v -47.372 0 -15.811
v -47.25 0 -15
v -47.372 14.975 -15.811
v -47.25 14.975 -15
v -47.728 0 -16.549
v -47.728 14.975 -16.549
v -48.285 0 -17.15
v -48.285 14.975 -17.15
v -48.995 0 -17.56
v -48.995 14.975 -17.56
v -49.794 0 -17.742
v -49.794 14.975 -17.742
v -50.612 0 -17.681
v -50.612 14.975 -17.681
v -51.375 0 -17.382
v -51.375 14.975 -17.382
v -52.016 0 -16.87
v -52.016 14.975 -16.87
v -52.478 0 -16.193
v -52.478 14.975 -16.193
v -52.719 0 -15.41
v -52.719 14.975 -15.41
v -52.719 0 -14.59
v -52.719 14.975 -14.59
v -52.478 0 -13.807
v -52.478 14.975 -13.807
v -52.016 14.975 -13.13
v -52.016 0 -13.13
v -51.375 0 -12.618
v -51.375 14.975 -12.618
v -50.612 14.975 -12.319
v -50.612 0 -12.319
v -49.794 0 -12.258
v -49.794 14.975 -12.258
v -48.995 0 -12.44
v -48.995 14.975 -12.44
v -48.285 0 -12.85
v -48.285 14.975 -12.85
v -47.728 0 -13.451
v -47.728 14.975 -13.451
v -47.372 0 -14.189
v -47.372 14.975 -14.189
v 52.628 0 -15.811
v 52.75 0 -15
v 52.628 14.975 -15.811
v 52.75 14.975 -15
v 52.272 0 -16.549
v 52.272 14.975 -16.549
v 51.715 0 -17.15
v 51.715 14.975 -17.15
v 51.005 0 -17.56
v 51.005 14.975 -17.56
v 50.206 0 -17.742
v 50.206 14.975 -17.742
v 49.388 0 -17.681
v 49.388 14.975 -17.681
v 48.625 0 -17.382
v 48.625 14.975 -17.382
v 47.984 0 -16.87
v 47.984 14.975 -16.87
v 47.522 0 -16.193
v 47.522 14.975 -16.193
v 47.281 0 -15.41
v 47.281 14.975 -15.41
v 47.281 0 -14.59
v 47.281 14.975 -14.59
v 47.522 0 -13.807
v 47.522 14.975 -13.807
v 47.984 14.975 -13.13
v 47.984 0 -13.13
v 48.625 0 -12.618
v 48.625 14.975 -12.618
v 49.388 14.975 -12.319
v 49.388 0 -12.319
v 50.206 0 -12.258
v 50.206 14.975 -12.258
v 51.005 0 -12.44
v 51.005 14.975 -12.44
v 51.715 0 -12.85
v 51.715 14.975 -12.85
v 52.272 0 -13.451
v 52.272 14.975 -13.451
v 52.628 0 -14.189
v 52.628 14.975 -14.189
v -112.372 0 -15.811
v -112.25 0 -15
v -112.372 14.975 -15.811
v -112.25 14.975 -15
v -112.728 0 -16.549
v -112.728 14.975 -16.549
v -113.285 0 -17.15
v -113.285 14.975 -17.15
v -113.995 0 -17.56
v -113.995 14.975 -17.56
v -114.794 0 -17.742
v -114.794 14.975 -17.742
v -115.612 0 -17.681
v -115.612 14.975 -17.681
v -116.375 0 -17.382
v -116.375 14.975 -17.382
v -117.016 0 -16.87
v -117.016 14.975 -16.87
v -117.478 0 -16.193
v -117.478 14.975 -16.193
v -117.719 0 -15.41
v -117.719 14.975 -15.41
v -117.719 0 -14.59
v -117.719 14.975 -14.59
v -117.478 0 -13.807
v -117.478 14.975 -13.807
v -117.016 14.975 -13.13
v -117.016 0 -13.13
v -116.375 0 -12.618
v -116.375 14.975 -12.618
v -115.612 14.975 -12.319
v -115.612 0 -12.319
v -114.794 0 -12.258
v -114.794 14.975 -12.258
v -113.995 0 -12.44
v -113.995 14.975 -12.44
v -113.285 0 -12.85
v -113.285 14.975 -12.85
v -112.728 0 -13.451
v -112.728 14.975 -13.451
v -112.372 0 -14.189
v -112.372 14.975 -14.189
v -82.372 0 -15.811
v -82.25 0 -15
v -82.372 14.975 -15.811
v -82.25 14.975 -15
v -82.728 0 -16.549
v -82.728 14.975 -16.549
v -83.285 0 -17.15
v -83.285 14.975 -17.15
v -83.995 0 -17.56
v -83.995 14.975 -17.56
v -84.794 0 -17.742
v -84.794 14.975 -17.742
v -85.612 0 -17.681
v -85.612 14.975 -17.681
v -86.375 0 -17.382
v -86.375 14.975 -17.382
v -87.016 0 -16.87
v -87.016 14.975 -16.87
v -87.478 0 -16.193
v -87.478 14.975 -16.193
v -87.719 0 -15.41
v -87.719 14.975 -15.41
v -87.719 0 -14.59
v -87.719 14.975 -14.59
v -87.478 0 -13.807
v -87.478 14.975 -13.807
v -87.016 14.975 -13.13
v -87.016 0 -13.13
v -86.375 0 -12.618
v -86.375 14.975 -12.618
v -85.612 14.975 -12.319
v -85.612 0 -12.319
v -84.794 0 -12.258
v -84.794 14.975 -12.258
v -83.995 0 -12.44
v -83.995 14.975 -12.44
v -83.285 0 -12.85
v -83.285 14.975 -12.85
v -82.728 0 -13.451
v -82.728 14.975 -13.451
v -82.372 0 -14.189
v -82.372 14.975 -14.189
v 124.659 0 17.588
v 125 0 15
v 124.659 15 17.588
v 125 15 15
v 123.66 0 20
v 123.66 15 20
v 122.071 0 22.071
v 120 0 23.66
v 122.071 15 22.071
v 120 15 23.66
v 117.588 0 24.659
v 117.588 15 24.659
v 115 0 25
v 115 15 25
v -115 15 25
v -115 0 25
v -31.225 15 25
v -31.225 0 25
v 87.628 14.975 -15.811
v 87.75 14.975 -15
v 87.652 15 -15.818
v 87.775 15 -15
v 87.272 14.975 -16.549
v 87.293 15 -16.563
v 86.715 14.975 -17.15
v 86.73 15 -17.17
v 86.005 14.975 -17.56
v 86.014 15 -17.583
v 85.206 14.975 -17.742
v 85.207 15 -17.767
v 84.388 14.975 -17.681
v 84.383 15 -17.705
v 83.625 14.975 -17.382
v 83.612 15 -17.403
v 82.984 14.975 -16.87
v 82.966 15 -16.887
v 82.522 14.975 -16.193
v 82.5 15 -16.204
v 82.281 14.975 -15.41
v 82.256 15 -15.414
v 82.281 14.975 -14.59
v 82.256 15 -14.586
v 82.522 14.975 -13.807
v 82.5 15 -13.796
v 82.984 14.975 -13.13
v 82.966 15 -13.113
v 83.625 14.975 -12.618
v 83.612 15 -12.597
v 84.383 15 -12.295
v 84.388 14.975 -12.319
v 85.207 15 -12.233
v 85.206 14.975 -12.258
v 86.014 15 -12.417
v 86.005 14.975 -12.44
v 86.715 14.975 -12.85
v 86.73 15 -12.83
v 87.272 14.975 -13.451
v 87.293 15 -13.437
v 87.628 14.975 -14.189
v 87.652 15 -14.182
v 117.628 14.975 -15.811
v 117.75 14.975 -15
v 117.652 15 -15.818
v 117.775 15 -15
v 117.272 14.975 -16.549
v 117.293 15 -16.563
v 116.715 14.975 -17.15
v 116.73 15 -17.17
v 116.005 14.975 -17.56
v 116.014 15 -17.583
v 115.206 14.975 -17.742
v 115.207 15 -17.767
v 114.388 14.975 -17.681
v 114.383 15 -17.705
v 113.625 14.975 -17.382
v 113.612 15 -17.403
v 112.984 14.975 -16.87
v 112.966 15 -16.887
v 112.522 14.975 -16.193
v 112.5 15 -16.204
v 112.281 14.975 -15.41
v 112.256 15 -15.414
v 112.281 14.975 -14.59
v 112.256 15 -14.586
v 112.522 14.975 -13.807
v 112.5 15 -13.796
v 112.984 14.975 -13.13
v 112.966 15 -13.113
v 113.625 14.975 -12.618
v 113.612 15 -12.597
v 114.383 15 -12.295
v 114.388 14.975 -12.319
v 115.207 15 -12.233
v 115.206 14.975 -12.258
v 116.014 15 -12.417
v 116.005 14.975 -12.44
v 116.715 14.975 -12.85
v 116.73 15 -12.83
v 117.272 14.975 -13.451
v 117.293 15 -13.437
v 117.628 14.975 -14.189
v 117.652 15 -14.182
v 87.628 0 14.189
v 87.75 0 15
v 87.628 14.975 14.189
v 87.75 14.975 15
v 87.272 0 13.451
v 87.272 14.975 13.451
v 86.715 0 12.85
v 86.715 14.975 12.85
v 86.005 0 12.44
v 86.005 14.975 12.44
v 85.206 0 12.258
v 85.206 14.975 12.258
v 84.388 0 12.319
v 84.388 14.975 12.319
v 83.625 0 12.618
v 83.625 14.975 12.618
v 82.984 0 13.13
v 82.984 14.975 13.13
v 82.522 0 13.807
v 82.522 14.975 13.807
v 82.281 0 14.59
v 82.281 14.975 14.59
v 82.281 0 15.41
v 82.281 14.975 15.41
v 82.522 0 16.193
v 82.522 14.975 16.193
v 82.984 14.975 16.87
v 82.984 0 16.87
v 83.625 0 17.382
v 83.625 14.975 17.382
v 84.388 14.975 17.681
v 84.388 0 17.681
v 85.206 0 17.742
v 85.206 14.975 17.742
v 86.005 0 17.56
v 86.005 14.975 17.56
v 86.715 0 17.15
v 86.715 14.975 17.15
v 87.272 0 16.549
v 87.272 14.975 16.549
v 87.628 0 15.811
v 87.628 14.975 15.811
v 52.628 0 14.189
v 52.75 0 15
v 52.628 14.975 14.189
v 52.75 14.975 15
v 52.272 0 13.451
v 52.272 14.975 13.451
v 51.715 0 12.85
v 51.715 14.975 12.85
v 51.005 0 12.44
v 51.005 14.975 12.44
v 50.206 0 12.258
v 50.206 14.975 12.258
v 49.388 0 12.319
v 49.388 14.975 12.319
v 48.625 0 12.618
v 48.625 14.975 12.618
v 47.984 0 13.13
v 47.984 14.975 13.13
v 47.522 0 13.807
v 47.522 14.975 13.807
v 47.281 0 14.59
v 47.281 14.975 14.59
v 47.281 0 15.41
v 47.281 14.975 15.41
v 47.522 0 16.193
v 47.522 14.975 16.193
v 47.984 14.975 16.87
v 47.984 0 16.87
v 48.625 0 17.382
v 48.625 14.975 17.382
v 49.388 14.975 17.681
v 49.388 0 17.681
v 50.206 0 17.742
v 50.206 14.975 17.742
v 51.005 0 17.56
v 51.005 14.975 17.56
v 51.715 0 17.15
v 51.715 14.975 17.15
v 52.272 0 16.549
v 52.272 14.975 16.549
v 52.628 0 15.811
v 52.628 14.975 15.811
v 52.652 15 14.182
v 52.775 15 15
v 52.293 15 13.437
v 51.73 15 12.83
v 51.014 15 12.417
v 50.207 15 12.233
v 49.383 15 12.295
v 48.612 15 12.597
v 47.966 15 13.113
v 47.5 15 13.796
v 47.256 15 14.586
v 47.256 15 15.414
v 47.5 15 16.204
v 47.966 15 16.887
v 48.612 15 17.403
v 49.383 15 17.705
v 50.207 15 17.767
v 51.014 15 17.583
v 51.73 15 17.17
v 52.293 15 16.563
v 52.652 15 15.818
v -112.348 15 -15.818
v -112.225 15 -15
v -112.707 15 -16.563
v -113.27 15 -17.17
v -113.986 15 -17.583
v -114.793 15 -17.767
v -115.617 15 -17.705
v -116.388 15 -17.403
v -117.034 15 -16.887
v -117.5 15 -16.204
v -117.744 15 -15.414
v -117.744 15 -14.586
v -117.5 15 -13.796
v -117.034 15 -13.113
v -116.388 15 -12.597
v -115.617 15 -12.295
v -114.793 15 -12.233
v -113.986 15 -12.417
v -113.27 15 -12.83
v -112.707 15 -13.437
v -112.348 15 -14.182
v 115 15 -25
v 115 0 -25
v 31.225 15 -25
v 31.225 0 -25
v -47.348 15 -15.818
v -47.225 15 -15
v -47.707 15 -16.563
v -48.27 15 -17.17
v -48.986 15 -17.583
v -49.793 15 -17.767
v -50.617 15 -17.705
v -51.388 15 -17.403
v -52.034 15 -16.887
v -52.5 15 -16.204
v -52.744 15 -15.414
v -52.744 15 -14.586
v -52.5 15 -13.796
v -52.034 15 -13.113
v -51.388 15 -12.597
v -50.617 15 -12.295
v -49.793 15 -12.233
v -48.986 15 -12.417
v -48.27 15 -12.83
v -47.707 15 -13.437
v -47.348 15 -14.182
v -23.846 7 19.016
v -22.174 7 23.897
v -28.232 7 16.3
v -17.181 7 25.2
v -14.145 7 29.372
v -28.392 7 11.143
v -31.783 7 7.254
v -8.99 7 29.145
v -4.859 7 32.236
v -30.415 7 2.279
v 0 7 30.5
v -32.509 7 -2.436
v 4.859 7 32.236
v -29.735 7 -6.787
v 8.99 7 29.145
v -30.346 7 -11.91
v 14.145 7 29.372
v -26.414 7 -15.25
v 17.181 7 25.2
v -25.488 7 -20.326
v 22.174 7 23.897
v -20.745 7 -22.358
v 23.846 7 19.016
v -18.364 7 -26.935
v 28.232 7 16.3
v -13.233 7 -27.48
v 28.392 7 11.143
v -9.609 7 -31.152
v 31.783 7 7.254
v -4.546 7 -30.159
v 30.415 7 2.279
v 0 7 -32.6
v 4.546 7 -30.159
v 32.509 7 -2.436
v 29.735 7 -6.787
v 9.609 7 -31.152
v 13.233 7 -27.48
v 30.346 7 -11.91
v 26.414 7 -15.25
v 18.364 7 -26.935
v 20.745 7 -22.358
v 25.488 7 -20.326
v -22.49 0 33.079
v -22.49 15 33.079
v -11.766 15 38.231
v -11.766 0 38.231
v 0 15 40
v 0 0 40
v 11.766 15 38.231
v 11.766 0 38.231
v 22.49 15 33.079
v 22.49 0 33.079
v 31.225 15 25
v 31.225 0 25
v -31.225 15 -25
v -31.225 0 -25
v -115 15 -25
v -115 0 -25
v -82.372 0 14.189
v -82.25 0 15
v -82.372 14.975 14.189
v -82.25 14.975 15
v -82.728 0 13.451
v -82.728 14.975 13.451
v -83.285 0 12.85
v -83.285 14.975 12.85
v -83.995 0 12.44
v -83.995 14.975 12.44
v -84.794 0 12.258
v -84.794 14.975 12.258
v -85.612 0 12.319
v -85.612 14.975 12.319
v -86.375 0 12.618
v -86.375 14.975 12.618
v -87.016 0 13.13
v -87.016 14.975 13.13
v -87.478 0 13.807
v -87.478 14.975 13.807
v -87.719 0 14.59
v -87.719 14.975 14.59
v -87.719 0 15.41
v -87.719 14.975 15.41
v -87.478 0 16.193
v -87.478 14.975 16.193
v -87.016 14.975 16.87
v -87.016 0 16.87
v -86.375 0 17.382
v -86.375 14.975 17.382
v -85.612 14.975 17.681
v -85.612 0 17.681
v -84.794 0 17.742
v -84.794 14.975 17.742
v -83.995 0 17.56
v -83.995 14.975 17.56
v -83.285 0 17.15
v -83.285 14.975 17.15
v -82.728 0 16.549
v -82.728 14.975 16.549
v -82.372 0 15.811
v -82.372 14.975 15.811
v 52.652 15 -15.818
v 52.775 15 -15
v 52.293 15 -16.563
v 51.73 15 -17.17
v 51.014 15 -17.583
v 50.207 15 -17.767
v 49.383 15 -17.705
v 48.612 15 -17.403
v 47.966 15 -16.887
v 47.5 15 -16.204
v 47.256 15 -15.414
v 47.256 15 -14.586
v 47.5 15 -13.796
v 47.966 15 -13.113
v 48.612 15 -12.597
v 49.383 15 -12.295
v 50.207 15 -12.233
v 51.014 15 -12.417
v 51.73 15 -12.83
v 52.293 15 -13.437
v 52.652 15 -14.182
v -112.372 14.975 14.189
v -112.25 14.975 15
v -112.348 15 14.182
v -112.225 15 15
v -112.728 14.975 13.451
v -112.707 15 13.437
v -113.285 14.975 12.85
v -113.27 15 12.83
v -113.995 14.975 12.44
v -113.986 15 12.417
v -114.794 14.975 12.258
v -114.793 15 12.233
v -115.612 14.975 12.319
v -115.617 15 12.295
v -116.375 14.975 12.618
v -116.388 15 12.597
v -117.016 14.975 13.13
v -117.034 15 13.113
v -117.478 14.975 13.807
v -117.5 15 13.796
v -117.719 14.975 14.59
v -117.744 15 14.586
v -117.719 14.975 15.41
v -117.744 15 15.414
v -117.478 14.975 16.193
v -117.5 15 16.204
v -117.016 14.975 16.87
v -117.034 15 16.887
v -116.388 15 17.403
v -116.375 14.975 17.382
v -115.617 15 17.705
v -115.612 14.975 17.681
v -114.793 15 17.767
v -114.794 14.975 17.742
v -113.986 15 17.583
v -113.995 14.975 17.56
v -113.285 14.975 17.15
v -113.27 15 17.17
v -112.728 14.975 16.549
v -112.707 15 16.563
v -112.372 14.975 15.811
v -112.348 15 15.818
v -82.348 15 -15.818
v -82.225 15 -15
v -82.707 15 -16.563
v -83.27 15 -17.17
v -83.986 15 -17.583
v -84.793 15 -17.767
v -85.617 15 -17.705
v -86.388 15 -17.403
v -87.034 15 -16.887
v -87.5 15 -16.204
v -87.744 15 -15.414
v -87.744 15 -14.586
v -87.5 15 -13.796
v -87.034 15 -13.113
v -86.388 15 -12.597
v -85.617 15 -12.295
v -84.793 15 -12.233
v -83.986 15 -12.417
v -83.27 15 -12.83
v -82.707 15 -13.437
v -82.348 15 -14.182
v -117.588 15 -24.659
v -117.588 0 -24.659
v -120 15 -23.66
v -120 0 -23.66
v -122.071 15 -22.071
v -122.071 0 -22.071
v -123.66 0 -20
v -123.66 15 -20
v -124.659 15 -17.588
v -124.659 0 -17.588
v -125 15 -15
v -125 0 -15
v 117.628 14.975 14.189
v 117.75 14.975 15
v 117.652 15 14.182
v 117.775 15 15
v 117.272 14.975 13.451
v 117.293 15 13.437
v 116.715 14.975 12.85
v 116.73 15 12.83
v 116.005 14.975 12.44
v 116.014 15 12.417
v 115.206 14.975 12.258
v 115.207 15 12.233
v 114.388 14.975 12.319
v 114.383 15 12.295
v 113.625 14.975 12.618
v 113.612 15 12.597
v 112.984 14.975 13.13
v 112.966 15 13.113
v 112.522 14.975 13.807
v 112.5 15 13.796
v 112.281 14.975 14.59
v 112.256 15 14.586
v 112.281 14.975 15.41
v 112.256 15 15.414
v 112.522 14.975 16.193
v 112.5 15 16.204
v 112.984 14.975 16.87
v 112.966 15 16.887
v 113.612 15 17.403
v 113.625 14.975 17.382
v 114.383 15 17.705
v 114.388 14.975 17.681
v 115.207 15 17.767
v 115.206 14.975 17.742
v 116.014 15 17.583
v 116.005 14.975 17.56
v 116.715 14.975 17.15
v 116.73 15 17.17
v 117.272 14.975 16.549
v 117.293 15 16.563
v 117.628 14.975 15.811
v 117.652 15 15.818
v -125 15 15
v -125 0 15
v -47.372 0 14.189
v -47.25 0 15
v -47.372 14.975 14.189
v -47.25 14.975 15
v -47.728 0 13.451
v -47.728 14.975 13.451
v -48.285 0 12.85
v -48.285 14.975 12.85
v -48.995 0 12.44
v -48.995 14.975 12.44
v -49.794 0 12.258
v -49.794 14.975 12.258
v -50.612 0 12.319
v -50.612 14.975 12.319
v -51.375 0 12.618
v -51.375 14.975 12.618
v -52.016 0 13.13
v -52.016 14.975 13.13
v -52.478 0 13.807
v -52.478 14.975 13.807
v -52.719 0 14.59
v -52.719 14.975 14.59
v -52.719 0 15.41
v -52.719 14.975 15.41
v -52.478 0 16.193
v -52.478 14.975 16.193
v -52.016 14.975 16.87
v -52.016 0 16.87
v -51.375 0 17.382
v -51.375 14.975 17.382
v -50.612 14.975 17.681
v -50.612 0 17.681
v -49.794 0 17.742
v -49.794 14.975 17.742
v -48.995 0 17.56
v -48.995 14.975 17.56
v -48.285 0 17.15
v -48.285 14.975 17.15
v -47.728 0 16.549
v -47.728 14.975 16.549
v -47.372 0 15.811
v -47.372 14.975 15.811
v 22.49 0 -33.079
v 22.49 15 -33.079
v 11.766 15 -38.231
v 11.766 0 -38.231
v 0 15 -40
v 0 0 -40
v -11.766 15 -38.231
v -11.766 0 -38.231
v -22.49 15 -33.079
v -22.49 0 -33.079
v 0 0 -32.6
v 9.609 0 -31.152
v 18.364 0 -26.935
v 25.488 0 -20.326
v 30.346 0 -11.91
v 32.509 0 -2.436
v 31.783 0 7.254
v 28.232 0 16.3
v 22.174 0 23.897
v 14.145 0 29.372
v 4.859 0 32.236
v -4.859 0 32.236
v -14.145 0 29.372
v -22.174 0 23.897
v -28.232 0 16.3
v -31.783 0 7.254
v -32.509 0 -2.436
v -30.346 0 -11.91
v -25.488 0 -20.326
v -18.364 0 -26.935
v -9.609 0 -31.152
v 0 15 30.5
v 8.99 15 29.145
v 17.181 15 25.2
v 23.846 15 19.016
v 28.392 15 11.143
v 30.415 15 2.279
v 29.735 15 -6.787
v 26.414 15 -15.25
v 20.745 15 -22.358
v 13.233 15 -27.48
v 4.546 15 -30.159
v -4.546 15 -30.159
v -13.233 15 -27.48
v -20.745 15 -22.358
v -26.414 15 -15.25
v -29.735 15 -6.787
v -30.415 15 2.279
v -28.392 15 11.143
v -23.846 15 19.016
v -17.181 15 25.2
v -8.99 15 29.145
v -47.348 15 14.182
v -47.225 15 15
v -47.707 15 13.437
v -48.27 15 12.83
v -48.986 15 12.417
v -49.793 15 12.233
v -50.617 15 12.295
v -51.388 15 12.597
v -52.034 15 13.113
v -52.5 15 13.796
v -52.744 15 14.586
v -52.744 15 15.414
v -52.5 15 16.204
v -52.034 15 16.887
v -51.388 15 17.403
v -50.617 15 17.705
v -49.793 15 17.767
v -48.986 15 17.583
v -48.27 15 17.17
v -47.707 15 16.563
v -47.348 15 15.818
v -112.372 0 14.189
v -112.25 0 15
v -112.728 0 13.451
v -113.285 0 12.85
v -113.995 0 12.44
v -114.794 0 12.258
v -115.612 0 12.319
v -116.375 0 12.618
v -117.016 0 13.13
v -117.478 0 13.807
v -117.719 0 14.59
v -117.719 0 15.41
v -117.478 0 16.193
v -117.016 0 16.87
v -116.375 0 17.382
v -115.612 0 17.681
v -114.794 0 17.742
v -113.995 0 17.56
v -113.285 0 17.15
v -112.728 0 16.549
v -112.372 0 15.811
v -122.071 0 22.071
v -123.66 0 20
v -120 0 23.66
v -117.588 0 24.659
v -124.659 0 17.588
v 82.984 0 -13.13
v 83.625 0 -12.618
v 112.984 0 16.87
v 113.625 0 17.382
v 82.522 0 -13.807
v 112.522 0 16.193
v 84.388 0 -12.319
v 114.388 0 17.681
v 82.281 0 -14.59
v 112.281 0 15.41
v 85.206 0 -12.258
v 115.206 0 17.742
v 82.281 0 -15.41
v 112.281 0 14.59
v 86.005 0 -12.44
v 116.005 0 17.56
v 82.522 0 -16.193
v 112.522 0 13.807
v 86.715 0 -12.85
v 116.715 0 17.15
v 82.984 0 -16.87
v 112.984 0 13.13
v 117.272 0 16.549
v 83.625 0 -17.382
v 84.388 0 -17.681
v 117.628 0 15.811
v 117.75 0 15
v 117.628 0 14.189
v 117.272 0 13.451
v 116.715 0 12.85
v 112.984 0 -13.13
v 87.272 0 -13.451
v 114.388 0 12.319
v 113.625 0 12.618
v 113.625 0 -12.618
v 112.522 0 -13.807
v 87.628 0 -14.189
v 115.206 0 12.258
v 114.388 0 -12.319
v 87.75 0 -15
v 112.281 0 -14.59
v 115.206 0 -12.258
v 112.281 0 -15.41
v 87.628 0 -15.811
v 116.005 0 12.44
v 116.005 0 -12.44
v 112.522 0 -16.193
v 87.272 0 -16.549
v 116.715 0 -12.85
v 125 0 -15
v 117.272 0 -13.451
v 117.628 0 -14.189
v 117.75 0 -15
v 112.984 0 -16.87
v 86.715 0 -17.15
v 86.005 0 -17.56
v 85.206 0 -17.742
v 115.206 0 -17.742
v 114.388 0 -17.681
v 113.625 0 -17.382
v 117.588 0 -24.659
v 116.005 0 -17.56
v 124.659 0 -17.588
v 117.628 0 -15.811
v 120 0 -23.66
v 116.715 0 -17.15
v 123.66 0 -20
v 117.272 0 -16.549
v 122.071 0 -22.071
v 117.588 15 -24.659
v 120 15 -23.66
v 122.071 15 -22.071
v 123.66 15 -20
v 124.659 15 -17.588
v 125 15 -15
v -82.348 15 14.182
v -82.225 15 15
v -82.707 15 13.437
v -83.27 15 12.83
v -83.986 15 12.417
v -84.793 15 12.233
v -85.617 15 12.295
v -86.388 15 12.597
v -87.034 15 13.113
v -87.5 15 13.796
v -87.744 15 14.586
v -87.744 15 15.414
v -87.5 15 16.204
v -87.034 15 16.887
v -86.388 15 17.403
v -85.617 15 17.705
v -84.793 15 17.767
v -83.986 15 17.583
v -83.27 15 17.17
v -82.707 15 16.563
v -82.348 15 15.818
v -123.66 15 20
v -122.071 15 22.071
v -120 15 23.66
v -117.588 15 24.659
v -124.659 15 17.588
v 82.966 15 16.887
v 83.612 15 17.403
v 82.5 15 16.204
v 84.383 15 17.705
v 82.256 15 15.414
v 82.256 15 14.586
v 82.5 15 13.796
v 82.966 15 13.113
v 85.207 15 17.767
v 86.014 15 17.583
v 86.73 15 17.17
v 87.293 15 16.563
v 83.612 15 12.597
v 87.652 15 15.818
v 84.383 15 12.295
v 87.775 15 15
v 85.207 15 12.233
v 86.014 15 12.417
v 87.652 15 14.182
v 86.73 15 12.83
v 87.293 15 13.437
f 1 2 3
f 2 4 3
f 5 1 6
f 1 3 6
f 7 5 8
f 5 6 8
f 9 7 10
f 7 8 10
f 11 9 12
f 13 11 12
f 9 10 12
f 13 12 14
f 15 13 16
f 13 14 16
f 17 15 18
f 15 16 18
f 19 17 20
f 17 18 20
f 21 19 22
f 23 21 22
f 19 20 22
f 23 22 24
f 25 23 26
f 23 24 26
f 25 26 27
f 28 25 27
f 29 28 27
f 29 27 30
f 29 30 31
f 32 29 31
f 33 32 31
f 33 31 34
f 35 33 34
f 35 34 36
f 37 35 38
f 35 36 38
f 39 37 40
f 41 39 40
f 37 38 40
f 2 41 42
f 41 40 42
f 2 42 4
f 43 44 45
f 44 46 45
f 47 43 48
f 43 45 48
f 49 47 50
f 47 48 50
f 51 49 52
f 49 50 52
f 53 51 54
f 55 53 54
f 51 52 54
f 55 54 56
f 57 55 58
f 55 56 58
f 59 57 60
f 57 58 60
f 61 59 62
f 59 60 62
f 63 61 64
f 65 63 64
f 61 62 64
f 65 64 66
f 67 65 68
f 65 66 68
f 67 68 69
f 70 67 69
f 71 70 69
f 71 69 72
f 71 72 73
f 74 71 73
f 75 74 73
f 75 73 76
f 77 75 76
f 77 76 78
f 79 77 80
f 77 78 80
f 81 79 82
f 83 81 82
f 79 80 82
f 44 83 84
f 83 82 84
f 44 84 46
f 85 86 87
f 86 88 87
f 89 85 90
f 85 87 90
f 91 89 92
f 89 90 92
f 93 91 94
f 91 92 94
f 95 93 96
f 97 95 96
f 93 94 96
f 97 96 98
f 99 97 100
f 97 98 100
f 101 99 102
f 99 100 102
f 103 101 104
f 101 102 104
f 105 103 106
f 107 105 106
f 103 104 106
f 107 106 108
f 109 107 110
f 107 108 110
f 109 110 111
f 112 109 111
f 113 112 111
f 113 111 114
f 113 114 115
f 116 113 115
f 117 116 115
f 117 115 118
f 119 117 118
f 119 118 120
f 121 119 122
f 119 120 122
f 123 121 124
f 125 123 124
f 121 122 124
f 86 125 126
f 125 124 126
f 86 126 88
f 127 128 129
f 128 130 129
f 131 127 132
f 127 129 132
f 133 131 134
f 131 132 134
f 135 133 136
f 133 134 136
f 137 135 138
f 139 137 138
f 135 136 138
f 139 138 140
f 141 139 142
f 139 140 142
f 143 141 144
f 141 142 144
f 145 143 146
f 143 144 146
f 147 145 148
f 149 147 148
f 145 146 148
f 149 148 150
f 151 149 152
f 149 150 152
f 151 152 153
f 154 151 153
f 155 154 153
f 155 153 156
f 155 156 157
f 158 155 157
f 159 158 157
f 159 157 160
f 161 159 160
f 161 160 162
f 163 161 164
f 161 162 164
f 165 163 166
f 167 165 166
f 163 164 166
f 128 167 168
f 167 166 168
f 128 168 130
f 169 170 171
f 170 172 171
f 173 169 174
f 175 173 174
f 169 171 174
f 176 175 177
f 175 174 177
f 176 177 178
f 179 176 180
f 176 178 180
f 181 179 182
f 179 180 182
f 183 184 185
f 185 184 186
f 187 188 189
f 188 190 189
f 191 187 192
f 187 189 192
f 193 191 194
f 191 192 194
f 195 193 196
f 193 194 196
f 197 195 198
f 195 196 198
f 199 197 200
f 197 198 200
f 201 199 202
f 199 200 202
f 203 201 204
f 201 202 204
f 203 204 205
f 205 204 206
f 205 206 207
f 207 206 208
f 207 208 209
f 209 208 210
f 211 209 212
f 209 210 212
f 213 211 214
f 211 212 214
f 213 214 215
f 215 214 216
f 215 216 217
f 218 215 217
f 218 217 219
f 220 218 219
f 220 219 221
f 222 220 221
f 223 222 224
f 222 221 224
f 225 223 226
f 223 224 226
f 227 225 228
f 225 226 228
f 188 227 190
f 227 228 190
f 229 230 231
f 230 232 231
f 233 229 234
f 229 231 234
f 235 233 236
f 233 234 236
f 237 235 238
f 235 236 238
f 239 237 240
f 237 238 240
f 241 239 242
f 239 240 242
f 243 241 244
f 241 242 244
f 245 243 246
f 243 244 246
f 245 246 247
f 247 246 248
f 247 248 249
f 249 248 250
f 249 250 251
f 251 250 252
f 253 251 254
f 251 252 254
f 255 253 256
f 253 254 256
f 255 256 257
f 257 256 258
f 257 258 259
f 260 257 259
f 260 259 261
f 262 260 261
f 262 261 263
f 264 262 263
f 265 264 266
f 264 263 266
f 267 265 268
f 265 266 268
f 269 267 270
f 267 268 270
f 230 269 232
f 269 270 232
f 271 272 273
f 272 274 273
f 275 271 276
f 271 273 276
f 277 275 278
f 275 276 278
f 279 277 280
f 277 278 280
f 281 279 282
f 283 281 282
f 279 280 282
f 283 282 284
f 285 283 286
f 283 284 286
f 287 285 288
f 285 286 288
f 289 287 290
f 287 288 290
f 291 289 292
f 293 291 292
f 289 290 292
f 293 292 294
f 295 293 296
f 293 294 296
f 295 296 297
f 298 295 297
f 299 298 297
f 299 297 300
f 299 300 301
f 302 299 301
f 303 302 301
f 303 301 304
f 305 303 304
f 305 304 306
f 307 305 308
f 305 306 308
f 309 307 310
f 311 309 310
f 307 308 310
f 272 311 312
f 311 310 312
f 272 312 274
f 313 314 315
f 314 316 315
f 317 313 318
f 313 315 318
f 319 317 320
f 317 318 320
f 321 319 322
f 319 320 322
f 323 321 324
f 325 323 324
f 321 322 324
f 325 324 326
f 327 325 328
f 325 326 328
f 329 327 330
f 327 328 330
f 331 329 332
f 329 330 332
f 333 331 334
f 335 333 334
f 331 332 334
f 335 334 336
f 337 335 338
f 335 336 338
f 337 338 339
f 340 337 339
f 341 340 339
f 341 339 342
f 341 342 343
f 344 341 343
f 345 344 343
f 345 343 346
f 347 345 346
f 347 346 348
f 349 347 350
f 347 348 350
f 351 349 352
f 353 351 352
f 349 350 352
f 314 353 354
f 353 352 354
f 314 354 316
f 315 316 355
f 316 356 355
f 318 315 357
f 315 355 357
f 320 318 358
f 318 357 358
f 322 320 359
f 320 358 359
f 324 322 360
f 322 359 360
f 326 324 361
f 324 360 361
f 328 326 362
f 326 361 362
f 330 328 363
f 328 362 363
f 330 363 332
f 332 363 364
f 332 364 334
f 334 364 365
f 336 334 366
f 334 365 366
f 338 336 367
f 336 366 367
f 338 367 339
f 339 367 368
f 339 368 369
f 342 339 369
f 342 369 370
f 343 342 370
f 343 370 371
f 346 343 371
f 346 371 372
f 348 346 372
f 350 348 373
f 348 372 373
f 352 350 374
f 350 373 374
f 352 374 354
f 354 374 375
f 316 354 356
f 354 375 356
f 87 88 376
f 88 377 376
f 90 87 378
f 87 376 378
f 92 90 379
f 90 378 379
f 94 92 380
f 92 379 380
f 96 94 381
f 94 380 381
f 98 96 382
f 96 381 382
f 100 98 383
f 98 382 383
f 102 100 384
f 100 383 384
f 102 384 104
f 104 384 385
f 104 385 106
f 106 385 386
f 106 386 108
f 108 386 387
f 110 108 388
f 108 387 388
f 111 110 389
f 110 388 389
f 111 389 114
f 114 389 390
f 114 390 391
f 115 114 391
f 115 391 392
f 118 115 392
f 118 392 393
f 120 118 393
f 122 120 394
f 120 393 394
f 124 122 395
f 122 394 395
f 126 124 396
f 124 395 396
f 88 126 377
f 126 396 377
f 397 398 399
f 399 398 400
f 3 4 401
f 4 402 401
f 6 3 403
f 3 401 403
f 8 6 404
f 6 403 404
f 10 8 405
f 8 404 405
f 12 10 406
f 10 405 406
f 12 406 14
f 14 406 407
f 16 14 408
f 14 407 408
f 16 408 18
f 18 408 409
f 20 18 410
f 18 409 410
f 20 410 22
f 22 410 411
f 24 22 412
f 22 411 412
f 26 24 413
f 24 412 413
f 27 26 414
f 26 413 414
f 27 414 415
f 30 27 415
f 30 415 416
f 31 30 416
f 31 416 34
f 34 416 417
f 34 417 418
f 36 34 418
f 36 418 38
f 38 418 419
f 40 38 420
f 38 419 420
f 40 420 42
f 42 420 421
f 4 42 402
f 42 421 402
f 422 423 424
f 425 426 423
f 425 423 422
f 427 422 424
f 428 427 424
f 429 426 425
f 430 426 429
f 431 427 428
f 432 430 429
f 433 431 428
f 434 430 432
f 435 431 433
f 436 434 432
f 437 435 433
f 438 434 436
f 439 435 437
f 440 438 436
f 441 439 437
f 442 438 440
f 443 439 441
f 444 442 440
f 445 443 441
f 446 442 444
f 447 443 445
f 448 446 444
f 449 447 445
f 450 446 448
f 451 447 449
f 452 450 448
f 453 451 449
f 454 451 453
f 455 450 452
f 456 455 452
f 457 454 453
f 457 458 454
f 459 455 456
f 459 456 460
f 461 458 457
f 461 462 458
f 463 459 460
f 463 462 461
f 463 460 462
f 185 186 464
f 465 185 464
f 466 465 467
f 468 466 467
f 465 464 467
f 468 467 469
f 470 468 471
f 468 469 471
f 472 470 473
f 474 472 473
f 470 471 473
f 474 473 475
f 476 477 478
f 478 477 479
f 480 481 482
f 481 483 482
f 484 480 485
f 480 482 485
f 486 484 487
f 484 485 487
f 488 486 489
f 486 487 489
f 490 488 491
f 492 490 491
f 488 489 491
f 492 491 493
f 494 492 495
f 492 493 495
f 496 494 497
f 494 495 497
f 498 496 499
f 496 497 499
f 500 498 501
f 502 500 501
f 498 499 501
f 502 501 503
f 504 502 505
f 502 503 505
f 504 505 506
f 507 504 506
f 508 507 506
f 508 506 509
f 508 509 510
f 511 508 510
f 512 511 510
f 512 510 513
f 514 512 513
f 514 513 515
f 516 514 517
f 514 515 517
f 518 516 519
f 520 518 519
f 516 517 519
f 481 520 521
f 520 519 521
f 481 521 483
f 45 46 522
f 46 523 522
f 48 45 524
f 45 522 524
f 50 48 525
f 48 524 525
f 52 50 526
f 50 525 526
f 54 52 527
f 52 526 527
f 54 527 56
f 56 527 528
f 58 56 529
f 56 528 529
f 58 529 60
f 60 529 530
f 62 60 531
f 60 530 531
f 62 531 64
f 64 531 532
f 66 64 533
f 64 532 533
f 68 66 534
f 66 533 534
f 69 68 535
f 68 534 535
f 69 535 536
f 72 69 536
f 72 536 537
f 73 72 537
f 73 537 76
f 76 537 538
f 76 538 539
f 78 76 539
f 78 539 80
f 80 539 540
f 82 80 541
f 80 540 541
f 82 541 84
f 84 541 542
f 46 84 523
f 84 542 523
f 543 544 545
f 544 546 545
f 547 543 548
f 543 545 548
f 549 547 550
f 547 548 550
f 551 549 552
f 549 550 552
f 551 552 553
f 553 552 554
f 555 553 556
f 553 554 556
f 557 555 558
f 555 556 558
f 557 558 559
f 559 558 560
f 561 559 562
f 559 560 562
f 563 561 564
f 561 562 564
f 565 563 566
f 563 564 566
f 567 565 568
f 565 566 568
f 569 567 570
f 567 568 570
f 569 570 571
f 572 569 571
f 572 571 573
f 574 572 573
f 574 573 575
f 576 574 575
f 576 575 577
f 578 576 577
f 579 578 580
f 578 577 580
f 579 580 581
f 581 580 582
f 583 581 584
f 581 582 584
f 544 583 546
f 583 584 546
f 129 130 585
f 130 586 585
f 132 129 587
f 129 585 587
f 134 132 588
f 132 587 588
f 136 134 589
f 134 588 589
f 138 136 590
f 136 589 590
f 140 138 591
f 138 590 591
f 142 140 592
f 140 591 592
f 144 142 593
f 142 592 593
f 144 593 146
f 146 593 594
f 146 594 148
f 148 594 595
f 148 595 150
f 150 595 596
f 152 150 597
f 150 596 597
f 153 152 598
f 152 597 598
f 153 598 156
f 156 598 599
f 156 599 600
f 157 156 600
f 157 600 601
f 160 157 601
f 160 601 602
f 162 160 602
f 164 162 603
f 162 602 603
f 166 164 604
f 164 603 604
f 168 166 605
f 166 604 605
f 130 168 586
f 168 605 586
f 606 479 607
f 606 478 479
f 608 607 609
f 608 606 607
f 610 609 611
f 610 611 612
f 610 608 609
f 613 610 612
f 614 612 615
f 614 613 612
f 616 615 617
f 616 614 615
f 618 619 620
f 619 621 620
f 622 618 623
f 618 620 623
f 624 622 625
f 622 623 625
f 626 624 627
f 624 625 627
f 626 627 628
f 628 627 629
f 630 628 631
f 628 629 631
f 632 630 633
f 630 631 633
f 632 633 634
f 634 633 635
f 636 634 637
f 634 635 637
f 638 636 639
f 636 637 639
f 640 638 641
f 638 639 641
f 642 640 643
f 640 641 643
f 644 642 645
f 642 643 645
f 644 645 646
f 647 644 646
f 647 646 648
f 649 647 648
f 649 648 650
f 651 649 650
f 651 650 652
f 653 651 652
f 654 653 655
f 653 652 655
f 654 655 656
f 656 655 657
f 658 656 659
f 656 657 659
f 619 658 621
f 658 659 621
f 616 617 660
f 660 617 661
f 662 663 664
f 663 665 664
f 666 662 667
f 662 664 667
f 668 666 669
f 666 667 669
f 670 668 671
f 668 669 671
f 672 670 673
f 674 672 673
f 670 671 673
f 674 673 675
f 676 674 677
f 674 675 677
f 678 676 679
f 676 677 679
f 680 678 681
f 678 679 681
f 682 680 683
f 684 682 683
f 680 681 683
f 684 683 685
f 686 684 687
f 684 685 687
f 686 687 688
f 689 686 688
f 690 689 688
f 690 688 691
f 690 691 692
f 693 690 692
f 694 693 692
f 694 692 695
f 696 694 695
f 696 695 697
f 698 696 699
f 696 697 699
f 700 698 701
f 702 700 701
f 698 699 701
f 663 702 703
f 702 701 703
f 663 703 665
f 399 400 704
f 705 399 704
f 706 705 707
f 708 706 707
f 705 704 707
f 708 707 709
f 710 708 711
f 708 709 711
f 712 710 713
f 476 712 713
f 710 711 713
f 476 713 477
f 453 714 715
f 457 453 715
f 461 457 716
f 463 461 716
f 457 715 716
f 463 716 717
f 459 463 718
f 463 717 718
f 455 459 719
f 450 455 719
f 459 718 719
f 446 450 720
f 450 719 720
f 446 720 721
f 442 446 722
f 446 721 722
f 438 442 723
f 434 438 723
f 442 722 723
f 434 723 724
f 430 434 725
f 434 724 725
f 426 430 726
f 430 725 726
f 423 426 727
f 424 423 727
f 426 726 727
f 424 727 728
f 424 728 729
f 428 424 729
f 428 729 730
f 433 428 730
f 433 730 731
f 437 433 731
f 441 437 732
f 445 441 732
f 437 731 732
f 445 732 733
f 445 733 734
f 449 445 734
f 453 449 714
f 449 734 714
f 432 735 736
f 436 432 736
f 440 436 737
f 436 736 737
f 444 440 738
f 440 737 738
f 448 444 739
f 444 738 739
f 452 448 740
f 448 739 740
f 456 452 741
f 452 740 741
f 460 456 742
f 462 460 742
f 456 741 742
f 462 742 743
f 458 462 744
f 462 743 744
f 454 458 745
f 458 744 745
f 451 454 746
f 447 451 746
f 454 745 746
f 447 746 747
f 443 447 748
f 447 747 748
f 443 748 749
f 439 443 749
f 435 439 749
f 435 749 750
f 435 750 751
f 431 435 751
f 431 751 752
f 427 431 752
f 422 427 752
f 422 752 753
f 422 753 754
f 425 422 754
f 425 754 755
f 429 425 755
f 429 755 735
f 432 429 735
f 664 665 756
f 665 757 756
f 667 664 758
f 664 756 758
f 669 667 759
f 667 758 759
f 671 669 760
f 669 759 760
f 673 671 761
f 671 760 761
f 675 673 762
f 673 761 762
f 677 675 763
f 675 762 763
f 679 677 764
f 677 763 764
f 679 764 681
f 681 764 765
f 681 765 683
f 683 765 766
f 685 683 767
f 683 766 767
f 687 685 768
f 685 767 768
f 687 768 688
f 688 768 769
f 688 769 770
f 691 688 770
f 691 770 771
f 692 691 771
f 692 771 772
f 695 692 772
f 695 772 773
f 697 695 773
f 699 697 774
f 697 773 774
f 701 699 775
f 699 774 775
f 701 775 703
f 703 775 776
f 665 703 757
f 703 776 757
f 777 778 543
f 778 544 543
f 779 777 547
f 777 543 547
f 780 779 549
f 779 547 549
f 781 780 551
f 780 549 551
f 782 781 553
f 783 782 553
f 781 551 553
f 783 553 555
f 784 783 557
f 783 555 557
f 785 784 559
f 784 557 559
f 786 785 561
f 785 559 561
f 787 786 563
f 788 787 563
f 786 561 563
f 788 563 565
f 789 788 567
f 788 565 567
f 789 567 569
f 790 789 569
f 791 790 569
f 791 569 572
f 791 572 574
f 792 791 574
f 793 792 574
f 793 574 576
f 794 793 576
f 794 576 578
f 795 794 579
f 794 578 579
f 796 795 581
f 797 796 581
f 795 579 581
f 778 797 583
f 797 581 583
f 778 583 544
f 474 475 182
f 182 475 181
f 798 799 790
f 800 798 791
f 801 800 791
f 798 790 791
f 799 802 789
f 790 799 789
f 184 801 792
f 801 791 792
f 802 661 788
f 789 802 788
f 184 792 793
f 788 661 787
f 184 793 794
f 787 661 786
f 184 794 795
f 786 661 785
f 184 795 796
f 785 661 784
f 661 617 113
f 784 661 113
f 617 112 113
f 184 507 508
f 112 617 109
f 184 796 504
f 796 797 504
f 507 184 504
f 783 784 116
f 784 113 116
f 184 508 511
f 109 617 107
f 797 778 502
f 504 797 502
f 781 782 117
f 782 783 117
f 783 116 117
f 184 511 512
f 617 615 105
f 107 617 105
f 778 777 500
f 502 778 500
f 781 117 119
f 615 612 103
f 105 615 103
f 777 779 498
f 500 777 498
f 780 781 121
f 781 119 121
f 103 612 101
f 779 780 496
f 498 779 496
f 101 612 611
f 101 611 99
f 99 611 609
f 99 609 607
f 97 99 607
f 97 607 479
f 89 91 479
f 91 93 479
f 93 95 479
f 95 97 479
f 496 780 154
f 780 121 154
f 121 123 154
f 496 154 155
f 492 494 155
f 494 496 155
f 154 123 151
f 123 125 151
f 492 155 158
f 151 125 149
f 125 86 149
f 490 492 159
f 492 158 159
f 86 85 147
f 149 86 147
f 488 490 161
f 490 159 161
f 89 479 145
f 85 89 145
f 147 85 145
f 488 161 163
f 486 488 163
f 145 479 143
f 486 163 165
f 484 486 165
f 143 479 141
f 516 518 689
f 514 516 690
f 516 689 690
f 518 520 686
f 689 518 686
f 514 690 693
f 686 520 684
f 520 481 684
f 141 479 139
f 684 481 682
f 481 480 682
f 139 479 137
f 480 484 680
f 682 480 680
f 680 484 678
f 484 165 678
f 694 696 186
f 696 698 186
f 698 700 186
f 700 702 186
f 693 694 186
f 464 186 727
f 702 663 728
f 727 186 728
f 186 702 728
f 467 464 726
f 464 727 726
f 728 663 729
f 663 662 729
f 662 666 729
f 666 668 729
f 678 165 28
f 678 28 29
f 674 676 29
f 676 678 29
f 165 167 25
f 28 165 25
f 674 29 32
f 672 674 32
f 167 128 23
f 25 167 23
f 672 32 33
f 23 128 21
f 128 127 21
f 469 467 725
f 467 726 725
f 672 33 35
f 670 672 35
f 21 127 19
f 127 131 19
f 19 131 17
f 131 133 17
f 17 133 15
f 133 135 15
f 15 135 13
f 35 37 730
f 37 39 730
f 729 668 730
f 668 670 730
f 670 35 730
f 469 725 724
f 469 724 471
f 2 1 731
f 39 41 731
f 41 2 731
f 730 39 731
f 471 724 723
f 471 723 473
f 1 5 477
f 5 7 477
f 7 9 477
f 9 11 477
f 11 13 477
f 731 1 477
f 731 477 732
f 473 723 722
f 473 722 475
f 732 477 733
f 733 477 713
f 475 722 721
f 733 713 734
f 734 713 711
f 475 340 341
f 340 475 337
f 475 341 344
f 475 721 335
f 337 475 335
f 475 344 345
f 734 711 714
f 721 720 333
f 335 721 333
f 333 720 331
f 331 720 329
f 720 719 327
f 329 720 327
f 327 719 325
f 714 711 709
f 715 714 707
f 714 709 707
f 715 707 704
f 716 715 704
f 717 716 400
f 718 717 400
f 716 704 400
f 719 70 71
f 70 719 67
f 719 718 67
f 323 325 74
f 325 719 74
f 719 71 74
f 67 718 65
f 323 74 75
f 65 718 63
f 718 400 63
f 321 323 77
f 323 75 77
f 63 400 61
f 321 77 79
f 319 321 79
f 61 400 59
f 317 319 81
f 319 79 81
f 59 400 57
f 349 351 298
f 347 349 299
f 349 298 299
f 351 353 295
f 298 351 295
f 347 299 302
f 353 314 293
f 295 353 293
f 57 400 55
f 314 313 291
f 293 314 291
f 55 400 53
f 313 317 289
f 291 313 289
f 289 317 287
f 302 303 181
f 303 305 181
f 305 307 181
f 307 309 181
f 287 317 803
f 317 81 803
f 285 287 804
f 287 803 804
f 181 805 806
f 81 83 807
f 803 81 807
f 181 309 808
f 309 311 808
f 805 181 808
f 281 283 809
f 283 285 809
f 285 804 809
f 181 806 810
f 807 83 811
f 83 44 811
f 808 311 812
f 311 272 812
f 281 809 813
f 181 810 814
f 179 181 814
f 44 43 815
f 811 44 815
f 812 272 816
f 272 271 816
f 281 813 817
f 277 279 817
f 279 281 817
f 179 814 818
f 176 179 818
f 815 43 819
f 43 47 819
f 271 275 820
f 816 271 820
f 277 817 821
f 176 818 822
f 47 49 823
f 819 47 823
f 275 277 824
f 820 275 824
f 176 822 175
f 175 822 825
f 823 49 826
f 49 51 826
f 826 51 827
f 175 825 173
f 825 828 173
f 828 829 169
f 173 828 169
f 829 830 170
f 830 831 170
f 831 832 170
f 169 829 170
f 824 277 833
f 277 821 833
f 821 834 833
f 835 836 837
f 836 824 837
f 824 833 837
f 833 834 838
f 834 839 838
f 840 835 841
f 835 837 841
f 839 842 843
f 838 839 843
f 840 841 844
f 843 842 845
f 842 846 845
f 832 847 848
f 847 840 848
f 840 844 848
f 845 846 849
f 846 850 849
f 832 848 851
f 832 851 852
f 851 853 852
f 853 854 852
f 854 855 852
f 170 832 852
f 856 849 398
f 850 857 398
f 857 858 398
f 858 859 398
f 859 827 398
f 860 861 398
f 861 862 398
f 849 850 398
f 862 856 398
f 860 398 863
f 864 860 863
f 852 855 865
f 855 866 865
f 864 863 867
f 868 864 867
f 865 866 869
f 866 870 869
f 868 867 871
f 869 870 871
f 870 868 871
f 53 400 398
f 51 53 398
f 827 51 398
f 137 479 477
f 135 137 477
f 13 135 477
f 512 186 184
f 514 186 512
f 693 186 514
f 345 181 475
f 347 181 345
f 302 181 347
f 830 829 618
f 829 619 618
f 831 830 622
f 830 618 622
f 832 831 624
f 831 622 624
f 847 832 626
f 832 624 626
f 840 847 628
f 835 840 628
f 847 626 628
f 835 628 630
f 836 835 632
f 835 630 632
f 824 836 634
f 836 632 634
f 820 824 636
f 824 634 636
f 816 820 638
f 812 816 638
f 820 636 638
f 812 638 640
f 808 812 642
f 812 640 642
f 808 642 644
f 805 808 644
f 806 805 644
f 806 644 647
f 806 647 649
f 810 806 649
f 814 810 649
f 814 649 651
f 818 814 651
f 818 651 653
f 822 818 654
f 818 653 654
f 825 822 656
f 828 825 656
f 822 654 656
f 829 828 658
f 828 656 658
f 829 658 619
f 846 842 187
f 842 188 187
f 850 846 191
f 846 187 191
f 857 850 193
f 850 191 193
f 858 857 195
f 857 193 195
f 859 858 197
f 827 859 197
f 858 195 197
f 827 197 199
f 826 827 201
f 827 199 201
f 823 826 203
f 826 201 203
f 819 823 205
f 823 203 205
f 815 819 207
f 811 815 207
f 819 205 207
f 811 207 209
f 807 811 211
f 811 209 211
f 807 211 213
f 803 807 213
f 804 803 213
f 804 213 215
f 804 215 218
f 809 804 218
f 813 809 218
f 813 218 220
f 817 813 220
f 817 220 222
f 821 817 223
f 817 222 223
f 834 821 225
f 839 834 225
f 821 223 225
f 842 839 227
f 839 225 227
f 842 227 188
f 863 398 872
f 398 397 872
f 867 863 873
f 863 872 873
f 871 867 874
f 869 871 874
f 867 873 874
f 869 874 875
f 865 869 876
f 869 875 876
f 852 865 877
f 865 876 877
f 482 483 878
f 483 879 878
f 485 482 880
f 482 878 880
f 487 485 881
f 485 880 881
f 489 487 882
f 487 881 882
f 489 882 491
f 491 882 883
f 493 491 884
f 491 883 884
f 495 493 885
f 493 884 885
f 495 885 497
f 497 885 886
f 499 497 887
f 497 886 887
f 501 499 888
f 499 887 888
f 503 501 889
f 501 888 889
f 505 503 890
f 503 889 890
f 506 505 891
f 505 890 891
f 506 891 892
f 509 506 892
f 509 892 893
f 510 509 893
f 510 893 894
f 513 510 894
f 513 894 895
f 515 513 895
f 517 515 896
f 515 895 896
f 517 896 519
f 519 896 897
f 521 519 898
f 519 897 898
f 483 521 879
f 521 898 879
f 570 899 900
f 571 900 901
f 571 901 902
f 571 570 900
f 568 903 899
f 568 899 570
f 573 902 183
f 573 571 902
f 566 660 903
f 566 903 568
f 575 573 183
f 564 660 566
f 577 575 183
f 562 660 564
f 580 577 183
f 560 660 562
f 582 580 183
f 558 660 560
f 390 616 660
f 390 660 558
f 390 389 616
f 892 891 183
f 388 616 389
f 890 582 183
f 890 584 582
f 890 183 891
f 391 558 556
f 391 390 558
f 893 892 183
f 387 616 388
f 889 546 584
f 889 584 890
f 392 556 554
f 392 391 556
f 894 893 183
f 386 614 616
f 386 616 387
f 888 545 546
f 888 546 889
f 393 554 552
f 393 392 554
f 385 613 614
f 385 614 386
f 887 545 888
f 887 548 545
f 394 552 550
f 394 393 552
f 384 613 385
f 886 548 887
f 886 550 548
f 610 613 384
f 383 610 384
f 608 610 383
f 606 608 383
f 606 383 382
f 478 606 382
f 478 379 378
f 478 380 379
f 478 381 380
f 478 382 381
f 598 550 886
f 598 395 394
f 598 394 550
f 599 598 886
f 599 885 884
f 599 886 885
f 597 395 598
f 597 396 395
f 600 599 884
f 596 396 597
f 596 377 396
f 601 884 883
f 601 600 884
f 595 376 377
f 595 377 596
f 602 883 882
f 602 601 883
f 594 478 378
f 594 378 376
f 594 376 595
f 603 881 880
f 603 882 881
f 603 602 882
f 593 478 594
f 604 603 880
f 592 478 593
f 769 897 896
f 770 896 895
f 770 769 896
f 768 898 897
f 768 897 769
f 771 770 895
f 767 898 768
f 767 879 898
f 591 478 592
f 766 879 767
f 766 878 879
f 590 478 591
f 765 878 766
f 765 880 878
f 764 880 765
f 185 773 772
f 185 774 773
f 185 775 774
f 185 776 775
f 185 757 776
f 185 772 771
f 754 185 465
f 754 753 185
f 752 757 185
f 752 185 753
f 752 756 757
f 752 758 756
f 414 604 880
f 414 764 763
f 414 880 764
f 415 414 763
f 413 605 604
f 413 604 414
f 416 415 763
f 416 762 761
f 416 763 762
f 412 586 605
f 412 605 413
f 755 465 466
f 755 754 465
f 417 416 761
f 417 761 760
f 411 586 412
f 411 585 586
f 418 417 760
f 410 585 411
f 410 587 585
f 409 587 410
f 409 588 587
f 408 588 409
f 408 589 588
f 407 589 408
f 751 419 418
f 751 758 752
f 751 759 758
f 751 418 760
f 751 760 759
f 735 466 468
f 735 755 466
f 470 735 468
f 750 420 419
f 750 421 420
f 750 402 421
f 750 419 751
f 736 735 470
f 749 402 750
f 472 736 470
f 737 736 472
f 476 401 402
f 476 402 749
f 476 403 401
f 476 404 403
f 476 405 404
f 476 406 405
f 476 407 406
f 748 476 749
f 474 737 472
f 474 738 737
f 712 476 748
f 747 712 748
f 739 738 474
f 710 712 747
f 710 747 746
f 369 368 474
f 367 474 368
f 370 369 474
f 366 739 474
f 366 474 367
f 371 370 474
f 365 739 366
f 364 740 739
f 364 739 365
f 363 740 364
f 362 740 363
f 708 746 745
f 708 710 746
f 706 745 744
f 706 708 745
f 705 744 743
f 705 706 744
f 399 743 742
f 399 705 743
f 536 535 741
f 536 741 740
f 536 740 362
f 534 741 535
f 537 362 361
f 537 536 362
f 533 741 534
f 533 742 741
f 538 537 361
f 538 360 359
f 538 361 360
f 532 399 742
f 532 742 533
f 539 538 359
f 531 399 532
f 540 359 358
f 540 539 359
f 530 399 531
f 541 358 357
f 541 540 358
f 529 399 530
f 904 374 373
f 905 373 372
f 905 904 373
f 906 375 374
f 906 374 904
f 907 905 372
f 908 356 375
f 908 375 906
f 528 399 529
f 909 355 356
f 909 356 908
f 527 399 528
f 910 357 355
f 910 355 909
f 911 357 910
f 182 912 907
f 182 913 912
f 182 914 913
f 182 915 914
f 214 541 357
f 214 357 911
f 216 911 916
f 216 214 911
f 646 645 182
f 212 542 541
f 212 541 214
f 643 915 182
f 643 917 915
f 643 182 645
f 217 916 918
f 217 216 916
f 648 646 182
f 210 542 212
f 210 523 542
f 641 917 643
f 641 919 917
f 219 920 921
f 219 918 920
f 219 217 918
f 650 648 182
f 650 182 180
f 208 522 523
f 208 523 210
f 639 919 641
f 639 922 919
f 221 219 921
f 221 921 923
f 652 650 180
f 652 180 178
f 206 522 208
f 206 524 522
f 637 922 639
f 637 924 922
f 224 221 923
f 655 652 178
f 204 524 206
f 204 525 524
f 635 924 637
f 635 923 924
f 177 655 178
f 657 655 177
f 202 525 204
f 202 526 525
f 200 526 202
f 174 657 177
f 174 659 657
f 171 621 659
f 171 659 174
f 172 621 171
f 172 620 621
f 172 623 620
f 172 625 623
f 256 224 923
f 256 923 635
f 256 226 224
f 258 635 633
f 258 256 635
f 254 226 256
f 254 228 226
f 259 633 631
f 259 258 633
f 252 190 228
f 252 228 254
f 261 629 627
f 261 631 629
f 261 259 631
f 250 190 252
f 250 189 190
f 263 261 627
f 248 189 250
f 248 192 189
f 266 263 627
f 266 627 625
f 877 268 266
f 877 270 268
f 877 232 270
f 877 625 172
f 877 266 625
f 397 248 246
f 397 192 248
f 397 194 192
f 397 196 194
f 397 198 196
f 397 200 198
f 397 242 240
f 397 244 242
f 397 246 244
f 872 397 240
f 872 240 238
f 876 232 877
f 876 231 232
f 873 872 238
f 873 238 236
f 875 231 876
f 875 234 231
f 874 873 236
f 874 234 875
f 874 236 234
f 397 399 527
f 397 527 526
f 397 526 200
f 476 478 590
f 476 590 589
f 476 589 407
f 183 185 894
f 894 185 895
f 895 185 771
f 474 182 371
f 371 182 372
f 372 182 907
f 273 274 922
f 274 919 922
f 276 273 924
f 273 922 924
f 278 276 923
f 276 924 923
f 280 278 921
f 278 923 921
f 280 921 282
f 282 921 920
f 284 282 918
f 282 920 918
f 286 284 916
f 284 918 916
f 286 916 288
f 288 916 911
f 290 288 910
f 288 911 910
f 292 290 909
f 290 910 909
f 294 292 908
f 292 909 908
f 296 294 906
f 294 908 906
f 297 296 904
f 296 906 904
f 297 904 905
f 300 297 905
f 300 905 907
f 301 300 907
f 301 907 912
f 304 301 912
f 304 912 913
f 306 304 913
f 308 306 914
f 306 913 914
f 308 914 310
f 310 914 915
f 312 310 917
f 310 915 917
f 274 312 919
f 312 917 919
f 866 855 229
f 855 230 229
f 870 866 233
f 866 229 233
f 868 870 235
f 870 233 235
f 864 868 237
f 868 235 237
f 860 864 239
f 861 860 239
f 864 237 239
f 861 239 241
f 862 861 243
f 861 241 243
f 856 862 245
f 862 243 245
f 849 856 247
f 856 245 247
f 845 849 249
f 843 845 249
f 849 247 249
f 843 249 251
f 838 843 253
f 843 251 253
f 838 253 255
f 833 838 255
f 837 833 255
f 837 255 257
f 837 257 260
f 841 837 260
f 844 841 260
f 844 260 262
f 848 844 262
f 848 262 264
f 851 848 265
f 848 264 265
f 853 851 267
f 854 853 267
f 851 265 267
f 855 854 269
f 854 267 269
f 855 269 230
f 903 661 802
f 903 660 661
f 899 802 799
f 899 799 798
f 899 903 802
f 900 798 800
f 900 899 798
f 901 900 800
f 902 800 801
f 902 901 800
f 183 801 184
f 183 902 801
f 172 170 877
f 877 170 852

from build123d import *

# Parameters (mm, degrees)
BOSS_EXTRUDE1_DEPTH = 15
CUT_EXTRUDE3_REACH  = 134.098
SKETCH4_R           = 30.5
SKETCH3_R           = 32.6
CUT_EXTRUDE4_DEPTH  = 7
FILLET1_R           = 10


# Read off the part's stored shape, not the designer's step: M5 Clearance Hole1
with BuildPart() as part:
    # Sketch1 → Boss-Extrude1 (new body)
    with BuildSketch(Plane(origin=(0, 0, 0), x_dir=(1, 0, 0), z_dir=(0, 1, 0))):
        with BuildLine():
            ThreePointArc((31.224989992, 25), (0, 40), (-31.224989992, 25))
            Line((-31.224989992, 25), (31.224989992, 25))
        make_face()
        with BuildLine():
            Line((31.224989992, 25), (-31.224989992, 25))
            ThreePointArc((-31.224989992, 25), (-40, 0), (-31.224989992, -25))
            Line((-31.224989992, -25), (31.224989992, -25))
            ThreePointArc((31.224989992, -25), (37.742546282, -13.247648854), (40, 0))
            ThreePointArc((40, 0), (37.742546282, 13.247648854), (31.224989992, 25))
        make_face()
        with BuildLine():
            Line((-31.224989992, 25), (-125, 25))
            Line((-125, 25), (-125, -25))
            Line((-125, -25), (-31.224989992, -25))
            ThreePointArc((-31.224989992, -25), (-40, 0), (-31.224989992, 25))
        make_face()
        with BuildLine():
            Line((125, 25), (31.224989992, 25))
            ThreePointArc((31.224989992, 25), (37.742546282, 13.247648854), (40, 0))
            ThreePointArc((40, 0), (37.742546282, -13.247648854), (31.224989992, -25))
            Line((31.224989992, -25), (125, -25))
            Line((125, -25), (125, 25))
        make_face()
        with BuildLine():
            Line((31.224989992, -25), (-31.224989992, -25))
            ThreePointArc((-31.224989992, -25), (0, -40), (31.224989992, -25))
        make_face()
    extrude(amount=BOSS_EXTRUDE1_DEPTH)

    # Sketch4 → Cut-Extrude3 (cut, up to next)
    with BuildSketch(Plane(origin=(0, 15, 0), x_dir=(1, 0, 0), z_dir=(0, 1, 0)), mode=Mode.PRIVATE) as cut_extrude3_sk1:
        with Locations(Location((0, 0, 0), (0, 0, 270))):
            Circle(SKETCH4_R)
    cut_extrude3_tool1 = extrude(cut_extrude3_sk1.sketch, amount=-CUT_EXTRUDE3_REACH, mode=Mode.PRIVATE) & part.part
    add(cut_extrude3_tool1.solids().sort_by_distance((0, 15, 0))[0], mode=Mode.SUBTRACT)

    # Sketch3 → Cut-Extrude4 (cut)
    with BuildSketch(Plane.XZ):
        with Locations(Location((0, 0, 0), (0, 0, 270))):
            Circle(SKETCH3_R)
    extrude(amount=-CUT_EXTRUDE4_DEPTH, mode=Mode.SUBTRACT)

    # M5 Clearance Hole1 outline → M5 Clearance Hole1 (revolve, cut)
    with BuildSketch(Plane(origin=(-50, 0, 15), x_dir=(1, 0, 0), z_dir=(0, 0, 1))):
        Polygon((0, 0), (2.75, 0), (2.75, 14.975), (2.775, 15), (0, 15), align=None)
    revolve(axis=Axis((-50, 0, 15), (0, 1, 0)), mode=Mode.SUBTRACT)

    # M5 Clearance Hole1 2 outline → M5 Clearance Hole1 2 (revolve, cut)
    with BuildSketch(Plane(origin=(-50, 0, -15), x_dir=(1, 0, 0), z_dir=(0, 0, 1))):
        Polygon((0, 0), (2.75, 0), (2.75, 14.975), (2.775, 15), (0, 15), align=None)
    revolve(axis=Axis((-50, 0, -15), (0, 1, 0)), mode=Mode.SUBTRACT)

    # M5 Clearance Hole1 3 outline → M5 Clearance Hole1 3 (revolve, cut)
    with BuildSketch(Plane(origin=(50, 0, 15), x_dir=(1, 0, 0), z_dir=(0, 0, 1))):
        Polygon((0, 0), (2.75, 0), (2.75, 14.975), (2.775, 15), (0, 15), align=None)
    revolve(axis=Axis((50, 0, 15), (0, 1, 0)), mode=Mode.SUBTRACT)

    # M5 Clearance Hole1 4 outline → M5 Clearance Hole1 4 (revolve, cut)
    with BuildSketch(Plane(origin=(50, 0, -15), x_dir=(1, 0, 0), z_dir=(0, 0, 1))):
        Polygon((0, 0), (2.75, 0), (2.75, 14.975), (2.775, 15), (0, 15), align=None)
    revolve(axis=Axis((50, 0, -15), (0, 1, 0)), mode=Mode.SUBTRACT)

    # M5 Clearance Hole1 5 outline → M5 Clearance Hole1 5 (revolve, cut)
    with BuildSketch(Plane(origin=(115, 0, -15), x_dir=(1, 0, 0), z_dir=(0, 0, 1))):
        Polygon((0, 0), (2.75, 0), (2.75, 14.975), (2.775, 15), (0, 15), align=None)
    revolve(axis=Axis((115, 0, -15), (0, 1, 0)), mode=Mode.SUBTRACT)

    # M5 Clearance Hole1 6 outline → M5 Clearance Hole1 6 (revolve, cut)
    with BuildSketch(Plane(origin=(85, 0, 15), x_dir=(1, 0, 0), z_dir=(0, 0, 1))):
        Polygon((0, 0), (2.75, 0), (2.75, 14.975), (2.775, 15), (0, 15), align=None)
    revolve(axis=Axis((85, 0, 15), (0, 1, 0)), mode=Mode.SUBTRACT)

    # M5 Clearance Hole1 7 outline → M5 Clearance Hole1 7 (revolve, cut)
    with BuildSketch(Plane(origin=(115, 0, 15), x_dir=(1, 0, 0), z_dir=(0, 0, 1))):
        Polygon((0, 0), (2.75, 0), (2.75, 14.975), (2.775, 15), (0, 15), align=None)
    revolve(axis=Axis((115, 0, 15), (0, 1, 0)), mode=Mode.SUBTRACT)

    # M5 Clearance Hole1 8 outline → M5 Clearance Hole1 8 (revolve, cut)
    with BuildSketch(Plane(origin=(85, 0, -15), x_dir=(1, 0, 0), z_dir=(0, 0, 1))):
        Polygon((0, 0), (2.75, 0), (2.75, 14.975), (2.775, 15), (0, 15), align=None)
    revolve(axis=Axis((85, 0, -15), (0, 1, 0)), mode=Mode.SUBTRACT)

    # M5 Clearance Hole1 9 outline → M5 Clearance Hole1 9 (revolve, cut)
    with BuildSketch(Plane(origin=(-85, 0, -15), x_dir=(1, 0, 0), z_dir=(0, 0, 1))):
        Polygon((0, 0), (2.75, 0), (2.75, 14.975), (2.775, 15), (0, 15), align=None)
    revolve(axis=Axis((-85, 0, -15), (0, 1, 0)), mode=Mode.SUBTRACT)

    # M5 Clearance Hole1 10 outline → M5 Clearance Hole1 10 (revolve, cut)
    with BuildSketch(Plane(origin=(-115, 0, 15), x_dir=(1, 0, 0), z_dir=(0, 0, 1))):
        Polygon((0, 0), (2.75, 0), (2.75, 14.975), (2.775, 15), (0, 15), align=None)
    revolve(axis=Axis((-115, 0, 15), (0, 1, 0)), mode=Mode.SUBTRACT)

    # M5 Clearance Hole1 11 outline → M5 Clearance Hole1 11 (revolve, cut)
    with BuildSketch(Plane(origin=(-85, 0, 15), x_dir=(1, 0, 0), z_dir=(0, 0, 1))):
        Polygon((0, 0), (2.75, 0), (2.75, 14.975), (2.775, 15), (0, 15), align=None)
    revolve(axis=Axis((-85, 0, 15), (0, 1, 0)), mode=Mode.SUBTRACT)

    # M5 Clearance Hole1 12 outline → M5 Clearance Hole1 12 (revolve, cut)
    with BuildSketch(Plane(origin=(-115, 0, -15), x_dir=(1, 0, 0), z_dir=(0, 0, 1))):
        Polygon((0, 0), (2.75, 0), (2.75, 14.975), (2.775, 15), (0, 15), align=None)
    revolve(axis=Axis((-115, 0, -15), (0, 1, 0)), mode=Mode.SUBTRACT)

    # Fillet1
    fillet1_edges = [part.edges().sort_by_distance(p)[0] for p in [
        (125, 7.5, -25),
        (125, 7.5, 25),
        (-125, 7.5, 25),
        (-125, 7.5, -25),
    ]]
    fillet(fillet1_edges, radius=FILLET1_R)


solid = part.part
